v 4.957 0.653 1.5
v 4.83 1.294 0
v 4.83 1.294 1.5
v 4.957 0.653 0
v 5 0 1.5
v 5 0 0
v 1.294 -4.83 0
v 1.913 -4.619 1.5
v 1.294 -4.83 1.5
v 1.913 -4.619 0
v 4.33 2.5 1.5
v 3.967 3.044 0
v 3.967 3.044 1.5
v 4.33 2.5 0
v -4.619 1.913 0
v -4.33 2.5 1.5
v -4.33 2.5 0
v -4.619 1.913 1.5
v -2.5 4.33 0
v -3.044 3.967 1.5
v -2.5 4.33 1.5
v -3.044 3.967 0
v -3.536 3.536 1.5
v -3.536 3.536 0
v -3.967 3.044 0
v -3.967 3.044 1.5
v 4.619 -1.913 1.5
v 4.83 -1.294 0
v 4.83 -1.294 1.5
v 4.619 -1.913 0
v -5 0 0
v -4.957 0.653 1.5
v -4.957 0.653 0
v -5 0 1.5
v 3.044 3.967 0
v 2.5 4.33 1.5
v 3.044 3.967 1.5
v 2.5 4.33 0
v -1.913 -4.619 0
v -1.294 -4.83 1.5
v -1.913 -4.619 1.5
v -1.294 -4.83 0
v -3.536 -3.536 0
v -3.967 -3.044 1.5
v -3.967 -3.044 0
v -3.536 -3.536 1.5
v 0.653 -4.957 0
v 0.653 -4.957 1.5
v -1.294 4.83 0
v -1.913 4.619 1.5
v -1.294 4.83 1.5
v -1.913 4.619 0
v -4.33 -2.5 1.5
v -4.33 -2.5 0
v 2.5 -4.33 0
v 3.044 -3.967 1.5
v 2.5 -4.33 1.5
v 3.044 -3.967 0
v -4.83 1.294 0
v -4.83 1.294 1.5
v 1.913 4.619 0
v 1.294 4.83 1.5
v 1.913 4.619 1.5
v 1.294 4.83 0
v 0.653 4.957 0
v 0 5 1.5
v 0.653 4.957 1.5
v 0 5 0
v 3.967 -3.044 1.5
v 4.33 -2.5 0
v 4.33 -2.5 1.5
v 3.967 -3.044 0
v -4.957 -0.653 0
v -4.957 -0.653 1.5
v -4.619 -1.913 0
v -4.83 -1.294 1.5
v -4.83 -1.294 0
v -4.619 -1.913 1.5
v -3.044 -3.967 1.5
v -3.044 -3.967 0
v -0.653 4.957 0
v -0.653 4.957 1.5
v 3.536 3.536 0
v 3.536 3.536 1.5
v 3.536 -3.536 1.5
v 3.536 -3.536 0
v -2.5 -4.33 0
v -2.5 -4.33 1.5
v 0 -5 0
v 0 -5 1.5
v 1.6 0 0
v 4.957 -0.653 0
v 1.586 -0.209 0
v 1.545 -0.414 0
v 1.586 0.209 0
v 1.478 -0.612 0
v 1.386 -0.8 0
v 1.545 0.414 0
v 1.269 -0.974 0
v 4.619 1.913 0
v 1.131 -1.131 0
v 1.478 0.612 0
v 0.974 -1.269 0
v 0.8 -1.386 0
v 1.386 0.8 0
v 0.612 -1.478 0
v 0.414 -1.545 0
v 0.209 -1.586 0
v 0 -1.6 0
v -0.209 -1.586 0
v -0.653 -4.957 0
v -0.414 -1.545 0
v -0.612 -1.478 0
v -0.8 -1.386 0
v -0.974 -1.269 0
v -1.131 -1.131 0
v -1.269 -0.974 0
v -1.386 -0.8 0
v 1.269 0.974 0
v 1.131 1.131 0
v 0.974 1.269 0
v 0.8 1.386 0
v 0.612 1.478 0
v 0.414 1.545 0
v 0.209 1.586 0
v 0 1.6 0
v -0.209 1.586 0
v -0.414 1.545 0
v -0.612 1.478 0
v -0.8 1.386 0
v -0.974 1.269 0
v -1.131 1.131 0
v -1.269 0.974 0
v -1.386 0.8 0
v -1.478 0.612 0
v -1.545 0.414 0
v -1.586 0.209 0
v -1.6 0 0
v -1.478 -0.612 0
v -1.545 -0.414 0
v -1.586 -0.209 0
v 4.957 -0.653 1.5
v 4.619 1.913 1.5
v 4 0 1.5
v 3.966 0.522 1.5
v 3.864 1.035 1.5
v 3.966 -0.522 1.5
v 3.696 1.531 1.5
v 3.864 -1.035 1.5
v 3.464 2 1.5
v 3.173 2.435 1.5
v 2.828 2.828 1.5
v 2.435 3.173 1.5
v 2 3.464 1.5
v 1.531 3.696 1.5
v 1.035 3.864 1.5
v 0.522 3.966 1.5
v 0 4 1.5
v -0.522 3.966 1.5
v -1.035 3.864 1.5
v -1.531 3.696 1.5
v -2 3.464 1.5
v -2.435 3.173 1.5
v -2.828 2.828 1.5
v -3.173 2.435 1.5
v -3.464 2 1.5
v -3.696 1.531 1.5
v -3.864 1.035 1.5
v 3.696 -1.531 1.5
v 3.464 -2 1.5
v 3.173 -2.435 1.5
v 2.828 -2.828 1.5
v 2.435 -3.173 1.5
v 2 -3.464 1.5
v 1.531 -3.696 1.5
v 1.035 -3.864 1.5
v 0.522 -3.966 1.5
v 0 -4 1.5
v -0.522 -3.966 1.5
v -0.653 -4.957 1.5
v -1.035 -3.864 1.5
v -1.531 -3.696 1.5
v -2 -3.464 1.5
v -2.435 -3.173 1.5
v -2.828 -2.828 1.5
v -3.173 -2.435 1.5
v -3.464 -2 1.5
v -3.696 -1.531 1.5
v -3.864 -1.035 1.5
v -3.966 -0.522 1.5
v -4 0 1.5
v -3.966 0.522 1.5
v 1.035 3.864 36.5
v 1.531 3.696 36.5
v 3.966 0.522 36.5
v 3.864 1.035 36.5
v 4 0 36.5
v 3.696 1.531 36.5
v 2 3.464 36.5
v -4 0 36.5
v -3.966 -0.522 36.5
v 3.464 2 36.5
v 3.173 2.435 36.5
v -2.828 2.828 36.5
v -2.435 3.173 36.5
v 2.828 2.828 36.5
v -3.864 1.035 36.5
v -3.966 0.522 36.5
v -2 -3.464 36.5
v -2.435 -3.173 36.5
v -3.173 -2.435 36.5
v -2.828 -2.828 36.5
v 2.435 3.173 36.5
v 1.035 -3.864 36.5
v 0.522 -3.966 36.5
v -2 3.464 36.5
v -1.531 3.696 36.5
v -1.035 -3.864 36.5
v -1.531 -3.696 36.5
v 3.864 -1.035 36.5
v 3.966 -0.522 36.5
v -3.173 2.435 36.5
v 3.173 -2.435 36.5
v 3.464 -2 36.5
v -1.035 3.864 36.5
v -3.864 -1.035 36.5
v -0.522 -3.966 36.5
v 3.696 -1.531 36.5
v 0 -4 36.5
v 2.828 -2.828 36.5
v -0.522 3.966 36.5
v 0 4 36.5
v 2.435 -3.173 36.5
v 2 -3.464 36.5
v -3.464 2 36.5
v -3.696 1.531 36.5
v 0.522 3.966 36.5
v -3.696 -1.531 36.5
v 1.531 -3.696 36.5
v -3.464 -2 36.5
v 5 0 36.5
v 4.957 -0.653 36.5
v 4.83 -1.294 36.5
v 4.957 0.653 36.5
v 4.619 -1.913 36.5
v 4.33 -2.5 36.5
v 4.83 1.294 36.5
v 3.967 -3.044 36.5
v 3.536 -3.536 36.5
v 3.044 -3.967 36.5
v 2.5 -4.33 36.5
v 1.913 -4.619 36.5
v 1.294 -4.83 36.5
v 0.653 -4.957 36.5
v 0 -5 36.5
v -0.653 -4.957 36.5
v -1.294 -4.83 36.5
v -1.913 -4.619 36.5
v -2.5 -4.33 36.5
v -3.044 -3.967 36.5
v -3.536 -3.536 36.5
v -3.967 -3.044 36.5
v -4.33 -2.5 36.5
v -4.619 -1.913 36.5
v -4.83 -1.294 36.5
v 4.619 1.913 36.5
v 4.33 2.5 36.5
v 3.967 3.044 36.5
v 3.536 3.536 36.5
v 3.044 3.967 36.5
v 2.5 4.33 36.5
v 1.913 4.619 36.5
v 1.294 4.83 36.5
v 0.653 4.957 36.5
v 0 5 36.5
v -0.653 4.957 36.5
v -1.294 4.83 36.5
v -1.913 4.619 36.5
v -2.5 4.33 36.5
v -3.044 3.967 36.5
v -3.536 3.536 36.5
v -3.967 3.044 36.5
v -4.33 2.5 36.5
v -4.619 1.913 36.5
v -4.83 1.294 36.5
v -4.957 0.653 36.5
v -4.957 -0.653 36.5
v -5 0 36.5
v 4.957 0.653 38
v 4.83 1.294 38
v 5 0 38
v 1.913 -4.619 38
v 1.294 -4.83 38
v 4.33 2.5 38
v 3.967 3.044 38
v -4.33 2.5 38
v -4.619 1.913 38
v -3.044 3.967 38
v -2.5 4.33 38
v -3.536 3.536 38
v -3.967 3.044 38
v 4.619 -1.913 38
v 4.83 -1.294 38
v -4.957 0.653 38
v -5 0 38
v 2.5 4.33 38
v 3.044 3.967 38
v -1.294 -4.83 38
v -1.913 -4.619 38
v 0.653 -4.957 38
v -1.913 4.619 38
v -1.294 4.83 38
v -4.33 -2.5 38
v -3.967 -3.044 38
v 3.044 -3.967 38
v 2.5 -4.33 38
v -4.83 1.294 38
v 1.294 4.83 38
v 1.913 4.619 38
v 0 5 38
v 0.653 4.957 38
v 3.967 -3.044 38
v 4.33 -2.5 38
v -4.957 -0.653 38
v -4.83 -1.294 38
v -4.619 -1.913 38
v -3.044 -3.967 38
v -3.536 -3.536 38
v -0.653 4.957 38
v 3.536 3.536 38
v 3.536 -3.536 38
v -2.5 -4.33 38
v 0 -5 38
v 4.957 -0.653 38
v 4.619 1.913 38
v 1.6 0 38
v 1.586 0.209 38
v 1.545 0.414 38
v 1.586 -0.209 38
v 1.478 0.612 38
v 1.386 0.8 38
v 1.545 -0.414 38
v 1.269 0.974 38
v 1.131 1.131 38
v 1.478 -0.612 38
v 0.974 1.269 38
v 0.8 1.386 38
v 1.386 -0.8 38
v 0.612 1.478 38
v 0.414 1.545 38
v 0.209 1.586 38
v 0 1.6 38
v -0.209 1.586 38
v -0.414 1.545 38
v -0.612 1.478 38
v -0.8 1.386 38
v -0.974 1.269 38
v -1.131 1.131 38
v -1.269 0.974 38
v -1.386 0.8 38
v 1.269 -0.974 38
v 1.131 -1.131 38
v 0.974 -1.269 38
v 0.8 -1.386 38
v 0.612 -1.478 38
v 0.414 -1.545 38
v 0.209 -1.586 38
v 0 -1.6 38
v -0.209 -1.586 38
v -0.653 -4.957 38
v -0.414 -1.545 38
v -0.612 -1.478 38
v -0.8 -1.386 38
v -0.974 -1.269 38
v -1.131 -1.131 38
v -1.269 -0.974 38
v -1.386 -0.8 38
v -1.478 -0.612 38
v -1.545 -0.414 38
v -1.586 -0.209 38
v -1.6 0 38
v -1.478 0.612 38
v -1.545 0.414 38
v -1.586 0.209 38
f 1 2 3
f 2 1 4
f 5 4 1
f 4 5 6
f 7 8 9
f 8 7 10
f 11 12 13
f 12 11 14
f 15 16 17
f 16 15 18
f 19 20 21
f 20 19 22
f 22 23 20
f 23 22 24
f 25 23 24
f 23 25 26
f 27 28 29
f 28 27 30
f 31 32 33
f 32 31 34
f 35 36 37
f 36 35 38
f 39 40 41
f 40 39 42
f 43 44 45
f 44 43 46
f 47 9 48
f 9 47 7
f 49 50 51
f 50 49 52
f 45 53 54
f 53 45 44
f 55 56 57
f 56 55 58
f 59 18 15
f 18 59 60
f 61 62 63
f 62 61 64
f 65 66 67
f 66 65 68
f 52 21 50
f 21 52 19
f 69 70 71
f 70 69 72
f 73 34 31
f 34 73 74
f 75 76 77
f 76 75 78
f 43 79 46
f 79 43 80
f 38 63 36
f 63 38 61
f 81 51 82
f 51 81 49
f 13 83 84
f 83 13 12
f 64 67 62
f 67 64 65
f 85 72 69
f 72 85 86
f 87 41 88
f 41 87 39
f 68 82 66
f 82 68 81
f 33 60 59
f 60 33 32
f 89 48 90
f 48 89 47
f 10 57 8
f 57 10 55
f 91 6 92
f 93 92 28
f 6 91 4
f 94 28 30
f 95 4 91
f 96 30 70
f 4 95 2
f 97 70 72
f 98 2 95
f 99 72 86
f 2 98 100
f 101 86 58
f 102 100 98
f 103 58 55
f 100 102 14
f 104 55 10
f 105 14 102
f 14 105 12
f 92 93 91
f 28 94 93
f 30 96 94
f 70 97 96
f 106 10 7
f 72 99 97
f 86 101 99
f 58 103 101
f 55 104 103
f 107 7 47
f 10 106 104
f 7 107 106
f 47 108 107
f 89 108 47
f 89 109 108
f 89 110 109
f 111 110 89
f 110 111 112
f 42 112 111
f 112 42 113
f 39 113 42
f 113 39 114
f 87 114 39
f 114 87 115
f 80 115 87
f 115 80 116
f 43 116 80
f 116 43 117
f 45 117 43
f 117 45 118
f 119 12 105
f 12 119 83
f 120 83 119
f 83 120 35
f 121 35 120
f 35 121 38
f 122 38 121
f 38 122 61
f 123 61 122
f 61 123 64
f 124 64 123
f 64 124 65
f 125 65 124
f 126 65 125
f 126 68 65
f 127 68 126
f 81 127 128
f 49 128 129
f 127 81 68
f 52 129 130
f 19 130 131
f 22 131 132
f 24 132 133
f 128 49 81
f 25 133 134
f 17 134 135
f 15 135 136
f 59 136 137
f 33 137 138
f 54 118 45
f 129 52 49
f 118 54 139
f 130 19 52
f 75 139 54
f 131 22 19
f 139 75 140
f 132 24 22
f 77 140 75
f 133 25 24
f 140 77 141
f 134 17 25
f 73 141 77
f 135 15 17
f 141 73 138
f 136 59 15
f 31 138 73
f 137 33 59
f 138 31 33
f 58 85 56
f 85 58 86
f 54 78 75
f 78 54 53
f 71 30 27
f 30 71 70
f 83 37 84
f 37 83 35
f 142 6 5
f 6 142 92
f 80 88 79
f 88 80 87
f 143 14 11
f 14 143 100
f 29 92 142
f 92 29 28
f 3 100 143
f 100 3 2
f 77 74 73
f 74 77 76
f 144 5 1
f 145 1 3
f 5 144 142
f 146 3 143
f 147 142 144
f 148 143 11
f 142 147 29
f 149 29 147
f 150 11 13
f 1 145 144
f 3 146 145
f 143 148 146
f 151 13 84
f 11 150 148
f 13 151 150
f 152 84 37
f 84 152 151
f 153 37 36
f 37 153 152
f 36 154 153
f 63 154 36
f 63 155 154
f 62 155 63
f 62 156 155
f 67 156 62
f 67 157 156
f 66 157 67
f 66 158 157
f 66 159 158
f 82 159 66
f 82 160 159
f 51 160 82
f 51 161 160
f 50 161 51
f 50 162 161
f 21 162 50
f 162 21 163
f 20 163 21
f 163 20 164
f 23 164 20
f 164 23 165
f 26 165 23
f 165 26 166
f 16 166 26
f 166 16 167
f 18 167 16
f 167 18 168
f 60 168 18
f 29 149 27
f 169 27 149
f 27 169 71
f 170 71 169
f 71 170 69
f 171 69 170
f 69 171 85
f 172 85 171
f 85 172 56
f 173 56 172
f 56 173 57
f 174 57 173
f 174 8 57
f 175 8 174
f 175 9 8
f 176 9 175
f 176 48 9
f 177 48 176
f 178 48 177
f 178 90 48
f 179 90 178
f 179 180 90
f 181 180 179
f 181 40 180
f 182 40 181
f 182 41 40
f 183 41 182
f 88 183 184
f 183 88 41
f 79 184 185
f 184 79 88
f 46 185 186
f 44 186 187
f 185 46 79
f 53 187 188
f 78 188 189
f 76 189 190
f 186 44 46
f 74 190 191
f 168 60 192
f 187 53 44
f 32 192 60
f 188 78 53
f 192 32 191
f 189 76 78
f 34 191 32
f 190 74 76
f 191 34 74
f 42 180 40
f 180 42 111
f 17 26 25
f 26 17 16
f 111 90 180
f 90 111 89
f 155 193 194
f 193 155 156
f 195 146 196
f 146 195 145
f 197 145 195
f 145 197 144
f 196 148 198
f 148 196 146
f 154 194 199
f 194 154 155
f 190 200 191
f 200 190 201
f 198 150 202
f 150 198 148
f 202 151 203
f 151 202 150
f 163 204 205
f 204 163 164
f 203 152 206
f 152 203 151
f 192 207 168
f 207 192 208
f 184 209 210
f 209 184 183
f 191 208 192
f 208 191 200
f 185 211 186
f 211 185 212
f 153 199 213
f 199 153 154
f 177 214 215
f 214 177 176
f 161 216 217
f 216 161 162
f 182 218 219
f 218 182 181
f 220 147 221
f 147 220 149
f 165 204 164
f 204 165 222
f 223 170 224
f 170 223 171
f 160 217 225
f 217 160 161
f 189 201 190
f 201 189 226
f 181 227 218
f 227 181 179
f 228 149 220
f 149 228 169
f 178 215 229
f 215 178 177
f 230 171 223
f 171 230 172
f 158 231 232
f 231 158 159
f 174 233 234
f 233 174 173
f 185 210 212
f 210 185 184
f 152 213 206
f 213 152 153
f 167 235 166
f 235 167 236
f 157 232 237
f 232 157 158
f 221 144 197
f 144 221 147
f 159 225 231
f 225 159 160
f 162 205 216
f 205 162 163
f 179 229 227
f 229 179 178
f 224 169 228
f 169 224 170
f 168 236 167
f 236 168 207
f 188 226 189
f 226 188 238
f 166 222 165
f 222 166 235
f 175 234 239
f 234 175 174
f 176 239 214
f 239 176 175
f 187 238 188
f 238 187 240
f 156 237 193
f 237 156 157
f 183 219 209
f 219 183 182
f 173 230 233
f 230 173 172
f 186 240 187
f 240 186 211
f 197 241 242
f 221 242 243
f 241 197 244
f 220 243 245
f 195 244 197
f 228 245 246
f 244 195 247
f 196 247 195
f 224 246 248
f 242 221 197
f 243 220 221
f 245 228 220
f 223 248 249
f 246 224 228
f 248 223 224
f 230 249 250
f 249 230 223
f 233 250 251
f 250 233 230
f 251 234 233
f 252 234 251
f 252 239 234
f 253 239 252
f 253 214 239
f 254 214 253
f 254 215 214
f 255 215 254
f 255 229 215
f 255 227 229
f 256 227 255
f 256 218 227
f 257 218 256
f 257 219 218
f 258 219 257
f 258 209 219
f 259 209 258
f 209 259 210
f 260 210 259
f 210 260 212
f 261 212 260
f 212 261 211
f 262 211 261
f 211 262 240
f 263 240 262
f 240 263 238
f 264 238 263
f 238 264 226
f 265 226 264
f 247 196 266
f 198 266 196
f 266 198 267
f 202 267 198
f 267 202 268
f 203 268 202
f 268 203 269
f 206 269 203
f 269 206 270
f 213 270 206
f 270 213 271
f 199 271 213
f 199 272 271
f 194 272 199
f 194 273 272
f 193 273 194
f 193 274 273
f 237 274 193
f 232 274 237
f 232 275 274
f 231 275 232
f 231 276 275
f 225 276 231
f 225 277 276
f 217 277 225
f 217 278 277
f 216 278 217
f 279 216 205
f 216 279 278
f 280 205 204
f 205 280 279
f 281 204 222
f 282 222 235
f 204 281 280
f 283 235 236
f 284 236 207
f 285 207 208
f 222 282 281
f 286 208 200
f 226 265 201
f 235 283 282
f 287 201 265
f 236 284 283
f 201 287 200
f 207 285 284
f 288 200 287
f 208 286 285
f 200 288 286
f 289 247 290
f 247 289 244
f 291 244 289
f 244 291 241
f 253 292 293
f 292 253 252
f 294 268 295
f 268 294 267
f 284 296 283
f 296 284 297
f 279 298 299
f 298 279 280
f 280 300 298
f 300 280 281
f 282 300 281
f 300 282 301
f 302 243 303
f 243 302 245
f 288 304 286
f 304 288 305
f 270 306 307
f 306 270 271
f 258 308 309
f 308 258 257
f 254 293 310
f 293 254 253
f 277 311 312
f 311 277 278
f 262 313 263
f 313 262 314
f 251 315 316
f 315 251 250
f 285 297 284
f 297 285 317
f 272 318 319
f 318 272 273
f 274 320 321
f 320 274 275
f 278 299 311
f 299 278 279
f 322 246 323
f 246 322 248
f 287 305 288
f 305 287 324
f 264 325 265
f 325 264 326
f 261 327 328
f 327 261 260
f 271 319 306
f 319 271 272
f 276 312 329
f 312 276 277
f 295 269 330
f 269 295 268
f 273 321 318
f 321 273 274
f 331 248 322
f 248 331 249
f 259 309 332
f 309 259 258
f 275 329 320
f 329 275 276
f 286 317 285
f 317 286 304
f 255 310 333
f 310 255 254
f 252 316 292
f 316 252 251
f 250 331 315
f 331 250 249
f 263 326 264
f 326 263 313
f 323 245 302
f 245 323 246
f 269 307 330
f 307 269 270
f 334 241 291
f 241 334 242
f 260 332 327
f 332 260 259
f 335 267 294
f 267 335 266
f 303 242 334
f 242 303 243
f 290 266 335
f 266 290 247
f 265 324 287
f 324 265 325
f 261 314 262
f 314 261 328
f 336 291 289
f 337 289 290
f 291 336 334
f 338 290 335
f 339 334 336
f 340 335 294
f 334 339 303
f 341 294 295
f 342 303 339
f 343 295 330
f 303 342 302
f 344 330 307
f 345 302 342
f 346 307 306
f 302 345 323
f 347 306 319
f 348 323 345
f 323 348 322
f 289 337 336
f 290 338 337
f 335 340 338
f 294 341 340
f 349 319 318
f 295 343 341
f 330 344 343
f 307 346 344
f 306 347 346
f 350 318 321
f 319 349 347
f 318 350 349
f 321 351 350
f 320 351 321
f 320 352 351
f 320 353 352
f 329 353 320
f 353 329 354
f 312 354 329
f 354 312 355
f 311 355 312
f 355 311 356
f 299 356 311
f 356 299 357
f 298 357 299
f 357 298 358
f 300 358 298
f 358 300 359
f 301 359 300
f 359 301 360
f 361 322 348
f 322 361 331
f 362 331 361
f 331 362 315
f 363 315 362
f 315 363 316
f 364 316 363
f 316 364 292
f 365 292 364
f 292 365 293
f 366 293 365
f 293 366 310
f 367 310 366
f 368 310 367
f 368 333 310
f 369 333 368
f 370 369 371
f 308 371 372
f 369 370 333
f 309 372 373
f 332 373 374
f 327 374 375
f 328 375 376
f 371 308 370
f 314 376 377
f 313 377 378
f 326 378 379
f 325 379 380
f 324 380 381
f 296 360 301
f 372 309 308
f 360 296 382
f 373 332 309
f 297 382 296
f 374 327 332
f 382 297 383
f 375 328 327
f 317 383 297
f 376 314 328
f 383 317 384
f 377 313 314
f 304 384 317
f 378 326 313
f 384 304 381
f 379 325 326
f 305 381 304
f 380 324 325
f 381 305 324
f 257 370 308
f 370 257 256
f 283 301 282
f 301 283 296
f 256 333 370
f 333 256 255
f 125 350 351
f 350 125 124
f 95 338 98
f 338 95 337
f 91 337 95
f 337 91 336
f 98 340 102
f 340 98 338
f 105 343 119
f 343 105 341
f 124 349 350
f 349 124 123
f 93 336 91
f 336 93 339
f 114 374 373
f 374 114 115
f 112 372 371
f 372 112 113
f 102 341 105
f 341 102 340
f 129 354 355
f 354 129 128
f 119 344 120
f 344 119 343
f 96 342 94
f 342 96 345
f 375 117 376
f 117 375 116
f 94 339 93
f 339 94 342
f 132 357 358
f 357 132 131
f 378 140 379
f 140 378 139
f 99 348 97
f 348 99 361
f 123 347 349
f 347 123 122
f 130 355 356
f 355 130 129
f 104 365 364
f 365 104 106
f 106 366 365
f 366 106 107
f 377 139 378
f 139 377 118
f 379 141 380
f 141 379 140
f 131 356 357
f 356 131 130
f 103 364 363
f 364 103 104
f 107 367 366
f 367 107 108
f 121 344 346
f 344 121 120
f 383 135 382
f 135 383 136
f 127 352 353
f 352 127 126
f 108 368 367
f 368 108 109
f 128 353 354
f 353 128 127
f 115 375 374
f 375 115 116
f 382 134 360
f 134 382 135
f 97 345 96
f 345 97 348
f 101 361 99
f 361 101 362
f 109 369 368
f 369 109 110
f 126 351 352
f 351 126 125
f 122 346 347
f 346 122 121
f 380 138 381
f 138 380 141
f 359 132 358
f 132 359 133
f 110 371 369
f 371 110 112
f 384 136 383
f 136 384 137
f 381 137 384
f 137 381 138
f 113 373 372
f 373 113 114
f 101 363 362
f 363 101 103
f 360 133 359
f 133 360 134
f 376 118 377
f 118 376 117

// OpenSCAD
// EvoBot reference-01 — Deck Standoff (print 4x)
// Open in OpenSCAD → Render (F6) → Export STL (F7)

// Parametric dimensions (mm)
outer_dia     = 8;
inner_dia     = 3.2;
height        = 35;
flange_dia    = 10;
flange_thick  = 1.5;

$fn = 48;

module standoff() {
    difference() {
        union() {
            // Bottom flange
            cylinder(d=flange_dia, h=flange_thick);
            // Main body
            translate([0, 0, flange_thick])
                cylinder(d=outer_dia, h=height);
            // Top flange
            translate([0, 0, flange_thick + height])
                cylinder(d=flange_dia, h=flange_thick);
        }
        // M3 through-hole
        translate([0, 0, -1])
            cylinder(d=inner_dia, h=height + 2*flange_thick + 2);
    }
}

standoff();
